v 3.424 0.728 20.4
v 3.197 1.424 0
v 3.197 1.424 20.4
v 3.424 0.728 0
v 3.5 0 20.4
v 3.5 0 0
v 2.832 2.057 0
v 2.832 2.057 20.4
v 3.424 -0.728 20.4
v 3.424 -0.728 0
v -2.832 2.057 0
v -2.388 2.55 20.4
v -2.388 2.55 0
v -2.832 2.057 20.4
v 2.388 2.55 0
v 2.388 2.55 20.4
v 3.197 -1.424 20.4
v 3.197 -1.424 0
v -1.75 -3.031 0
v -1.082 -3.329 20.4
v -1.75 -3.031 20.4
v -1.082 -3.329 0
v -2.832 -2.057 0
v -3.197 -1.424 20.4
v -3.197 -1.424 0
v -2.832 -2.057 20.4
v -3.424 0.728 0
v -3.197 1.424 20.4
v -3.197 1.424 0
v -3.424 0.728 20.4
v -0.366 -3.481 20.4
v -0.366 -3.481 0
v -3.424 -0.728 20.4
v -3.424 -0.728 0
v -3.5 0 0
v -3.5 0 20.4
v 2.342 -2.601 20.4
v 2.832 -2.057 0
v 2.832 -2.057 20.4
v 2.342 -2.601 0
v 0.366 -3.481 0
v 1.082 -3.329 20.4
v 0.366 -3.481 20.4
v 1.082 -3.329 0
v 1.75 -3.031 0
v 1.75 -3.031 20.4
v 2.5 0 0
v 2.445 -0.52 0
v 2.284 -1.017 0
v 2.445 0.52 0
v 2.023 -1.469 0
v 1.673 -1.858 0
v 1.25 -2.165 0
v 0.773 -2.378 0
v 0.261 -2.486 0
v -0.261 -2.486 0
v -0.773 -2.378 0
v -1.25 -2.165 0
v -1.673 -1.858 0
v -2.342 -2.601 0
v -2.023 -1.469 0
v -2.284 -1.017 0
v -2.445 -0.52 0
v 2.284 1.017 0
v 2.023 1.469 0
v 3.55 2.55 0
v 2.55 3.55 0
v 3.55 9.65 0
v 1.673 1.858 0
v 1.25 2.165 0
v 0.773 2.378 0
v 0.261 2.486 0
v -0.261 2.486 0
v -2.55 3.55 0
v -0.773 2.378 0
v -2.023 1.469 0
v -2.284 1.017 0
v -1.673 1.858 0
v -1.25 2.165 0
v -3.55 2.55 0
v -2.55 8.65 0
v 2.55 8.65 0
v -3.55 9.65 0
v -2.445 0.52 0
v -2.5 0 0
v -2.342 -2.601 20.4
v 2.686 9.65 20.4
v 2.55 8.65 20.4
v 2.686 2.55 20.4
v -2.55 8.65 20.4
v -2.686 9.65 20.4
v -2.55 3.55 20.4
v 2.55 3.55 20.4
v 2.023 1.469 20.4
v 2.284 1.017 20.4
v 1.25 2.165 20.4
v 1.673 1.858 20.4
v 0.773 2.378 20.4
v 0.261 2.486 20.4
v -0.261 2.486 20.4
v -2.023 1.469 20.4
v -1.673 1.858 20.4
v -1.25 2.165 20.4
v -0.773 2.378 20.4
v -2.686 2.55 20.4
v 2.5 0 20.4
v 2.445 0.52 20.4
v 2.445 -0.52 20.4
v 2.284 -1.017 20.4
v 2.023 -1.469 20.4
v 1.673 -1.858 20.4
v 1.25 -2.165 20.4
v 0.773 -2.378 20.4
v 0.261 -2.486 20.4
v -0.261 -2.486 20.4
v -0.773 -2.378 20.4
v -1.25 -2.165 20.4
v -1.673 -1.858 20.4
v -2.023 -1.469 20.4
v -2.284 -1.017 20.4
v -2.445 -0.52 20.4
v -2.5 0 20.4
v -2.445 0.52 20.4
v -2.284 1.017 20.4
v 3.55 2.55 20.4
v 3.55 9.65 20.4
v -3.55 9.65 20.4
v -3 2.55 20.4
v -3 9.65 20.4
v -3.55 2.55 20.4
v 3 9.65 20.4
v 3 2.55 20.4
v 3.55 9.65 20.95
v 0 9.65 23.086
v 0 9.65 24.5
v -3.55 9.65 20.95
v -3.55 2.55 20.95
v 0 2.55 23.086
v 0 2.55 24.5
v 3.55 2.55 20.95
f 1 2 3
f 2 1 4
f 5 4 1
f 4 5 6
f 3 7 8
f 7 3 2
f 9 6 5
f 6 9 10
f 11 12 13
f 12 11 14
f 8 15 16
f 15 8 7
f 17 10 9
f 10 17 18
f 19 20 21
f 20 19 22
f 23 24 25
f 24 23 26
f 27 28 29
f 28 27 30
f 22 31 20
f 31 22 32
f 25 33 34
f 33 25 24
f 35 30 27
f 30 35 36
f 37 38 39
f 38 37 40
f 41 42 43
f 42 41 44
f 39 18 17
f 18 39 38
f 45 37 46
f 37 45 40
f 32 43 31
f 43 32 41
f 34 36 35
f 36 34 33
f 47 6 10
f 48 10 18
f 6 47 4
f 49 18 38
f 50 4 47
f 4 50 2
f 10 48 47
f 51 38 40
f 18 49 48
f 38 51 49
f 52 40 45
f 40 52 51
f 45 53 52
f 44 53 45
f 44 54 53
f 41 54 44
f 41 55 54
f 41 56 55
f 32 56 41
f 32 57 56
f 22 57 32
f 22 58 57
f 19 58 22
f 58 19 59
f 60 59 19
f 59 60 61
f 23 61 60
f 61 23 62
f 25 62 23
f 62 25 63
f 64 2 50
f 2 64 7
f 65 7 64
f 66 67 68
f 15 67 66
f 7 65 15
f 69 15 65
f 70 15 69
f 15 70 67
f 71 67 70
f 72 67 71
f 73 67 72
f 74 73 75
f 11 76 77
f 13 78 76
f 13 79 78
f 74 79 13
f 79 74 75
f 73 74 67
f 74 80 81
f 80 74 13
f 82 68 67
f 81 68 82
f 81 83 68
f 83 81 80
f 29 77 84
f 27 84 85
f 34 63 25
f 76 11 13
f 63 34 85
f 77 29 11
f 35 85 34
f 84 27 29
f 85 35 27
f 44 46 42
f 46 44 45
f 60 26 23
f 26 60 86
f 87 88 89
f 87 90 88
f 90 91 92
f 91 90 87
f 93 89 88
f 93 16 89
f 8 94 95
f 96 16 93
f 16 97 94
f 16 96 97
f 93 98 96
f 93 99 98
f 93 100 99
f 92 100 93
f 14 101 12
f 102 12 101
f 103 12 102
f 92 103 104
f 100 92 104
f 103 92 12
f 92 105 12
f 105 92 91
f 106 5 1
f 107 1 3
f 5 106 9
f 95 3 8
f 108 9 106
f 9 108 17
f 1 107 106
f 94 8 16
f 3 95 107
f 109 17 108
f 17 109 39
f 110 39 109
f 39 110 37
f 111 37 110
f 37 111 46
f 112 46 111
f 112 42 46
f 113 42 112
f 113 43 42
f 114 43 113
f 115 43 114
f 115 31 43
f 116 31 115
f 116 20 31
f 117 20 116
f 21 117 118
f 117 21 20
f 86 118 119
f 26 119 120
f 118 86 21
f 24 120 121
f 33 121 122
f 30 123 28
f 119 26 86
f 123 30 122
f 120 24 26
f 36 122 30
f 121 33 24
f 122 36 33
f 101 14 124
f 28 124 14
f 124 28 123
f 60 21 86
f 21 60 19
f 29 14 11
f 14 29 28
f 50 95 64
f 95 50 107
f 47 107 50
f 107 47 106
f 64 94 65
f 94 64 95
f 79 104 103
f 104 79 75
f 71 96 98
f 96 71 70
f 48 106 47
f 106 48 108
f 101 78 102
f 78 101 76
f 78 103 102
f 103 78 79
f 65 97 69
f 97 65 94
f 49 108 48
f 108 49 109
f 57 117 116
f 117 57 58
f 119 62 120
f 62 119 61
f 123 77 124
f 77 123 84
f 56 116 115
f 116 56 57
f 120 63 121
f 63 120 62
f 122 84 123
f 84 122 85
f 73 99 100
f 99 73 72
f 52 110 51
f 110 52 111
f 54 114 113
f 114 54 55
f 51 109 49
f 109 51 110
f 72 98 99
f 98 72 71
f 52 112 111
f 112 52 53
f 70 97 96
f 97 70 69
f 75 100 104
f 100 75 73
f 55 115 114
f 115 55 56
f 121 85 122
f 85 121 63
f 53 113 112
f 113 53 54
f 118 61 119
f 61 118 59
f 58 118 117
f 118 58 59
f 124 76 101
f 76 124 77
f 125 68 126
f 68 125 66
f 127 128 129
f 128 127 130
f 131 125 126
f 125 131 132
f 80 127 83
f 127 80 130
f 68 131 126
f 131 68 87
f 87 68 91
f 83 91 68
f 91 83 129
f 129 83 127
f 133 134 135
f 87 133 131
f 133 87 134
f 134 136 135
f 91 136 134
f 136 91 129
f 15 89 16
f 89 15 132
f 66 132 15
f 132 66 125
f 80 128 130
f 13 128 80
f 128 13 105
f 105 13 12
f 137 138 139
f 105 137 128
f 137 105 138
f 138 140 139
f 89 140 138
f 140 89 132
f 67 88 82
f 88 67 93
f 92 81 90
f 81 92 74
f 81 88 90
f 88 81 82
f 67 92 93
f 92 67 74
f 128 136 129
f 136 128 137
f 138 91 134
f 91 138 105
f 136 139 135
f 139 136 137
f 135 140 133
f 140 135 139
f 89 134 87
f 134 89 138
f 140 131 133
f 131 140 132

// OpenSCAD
magnet_edge_length = 5.1;
rope_radius = 2.5;
wall_thickness = 1;
magnet_count = 4;

diff_padding = 1;


module rope_guard() {
    difference() {
        cylinder(r=rope_radius+wall_thickness, h=magnet_count*magnet_edge_length, $fs=0.1);
        translate([0,0,-wall_thickness])
            cylinder(r=rope_radius, h=magnet_count*magnet_edge_length + 2*wall_thickness, $fs=0.1);
    };
}

module magnet_guard() {
    outer_length = magnet_edge_length+2*wall_thickness;
    height = magnet_edge_length*magnet_count;
    diag_len = sqrt(outer_length*outer_length*2) / 2;
    
    union() {
        difference() {
            cube([outer_length, outer_length, height]);
            translate([wall_thickness, wall_thickness, -diff_padding])
            cube([magnet_edge_length, magnet_edge_length, height + 2*diff_padding]);
        }
        translate([outer_length/2, 0, height+magnet_edge_length-wall_thickness]) 
            rotate([0, 135, 0])
            union() {
                cube([diag_len, outer_length, wall_thickness]);
                cube([wall_thickness, outer_length, diag_len]);
            }
        
   }
    
}

union() {
    rope_guard();
    translate([-magnet_edge_length/2-wall_thickness, magnet_edge_length/2, 0])
        magnet_guard();
}
